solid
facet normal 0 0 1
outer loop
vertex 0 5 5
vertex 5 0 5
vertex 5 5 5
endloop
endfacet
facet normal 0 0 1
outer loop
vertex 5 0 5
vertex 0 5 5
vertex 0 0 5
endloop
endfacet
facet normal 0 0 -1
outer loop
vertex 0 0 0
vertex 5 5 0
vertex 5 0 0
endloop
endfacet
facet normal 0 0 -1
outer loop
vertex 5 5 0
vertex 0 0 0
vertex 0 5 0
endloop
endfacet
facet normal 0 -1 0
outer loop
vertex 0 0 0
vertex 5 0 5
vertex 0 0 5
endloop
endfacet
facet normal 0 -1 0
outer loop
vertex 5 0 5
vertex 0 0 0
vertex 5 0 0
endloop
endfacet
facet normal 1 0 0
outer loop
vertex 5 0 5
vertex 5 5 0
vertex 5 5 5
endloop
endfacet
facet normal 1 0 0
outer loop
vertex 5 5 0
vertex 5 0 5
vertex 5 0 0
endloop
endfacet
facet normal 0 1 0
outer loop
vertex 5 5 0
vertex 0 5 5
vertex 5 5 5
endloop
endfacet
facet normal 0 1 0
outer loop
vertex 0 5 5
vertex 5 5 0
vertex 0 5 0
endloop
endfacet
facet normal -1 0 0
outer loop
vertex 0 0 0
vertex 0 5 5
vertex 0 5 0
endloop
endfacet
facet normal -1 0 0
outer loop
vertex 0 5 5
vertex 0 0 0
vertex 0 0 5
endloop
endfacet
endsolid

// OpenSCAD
// A `!` buried INSIDE a `%` subtree. It still governs the whole model.
//
// WHY IT WAS CHOSEN. `edge_modifier_background` is one `%` on one statement and
// stayed `SAME` through the defect below. The two characters only interact when
// one is inside the other, and no corpus case put them there.
//
// WHAT IT WOULD CATCH — and this one produced A DIFFERENT OBJECT, not a missing
// one. `find_root_tag` walks the instantiated tree and does not care what its
// ancestors are tagged with, so a root modifier written inside a background
// subtree wins exactly as if it had been written at the top. Measured at
// openscad 2026.08.07: this file exports the CUBE, 12 facets, 125 mm³. We used
// to discard the `%` body at PARSE time, never saw the `!` inside it, and
// exported the SPHERE at 31418 mm³ — the wrong part, silently, with the file's
// only refusal being the one that names `%` for a missing preview ghost.
//
// 🔴 THE SPHERE IS THE CONTROL AND IT IS THE WRONG ANSWER ON PURPOSE. A working
// root modifier suppresses it; every regression in this family releases it. That
// is the opposite polarity to a control solid that must always be emitted, and
// it is the polarity this construct allows — `!` exists to suppress siblings, so
// a sibling that is always emitted cannot be written here. It converts a lost
// capability into `DIVERGES` all the same: emit the sphere and the tree leg has
// a 20 mm bounding-box difference to report, rather than a `REFUSED` that `CAD1`
// reads as safe.
//
// ⚠ THE RESIDUAL THIS CASE DOES NOT REACH. The `!` is found by EVALUATING the
// `%` body into a throwaway sink, under the node and iteration budgets. A `!`
// buried deep enough that the search halts on budget before reaching it is not
// honoured, and nothing says so. This file is far under any budget, so it proves
// the mechanism and not its limit. See `docs/audit/2026-08-11-scad-silent-
// divergence.md`.
//
// Decidability: one solid on both sides in the correct run; in a planted run the
// sphere replaces it rather than joining it. Never two overlapping solids.
//
// PLANTED AND WATCHED RED (throwaway copy of `web/src/cad/scad.ts`, md5-verified
// against the live file before the edit; openscad 2026.08.07):
//   · the `%` body discarded at parse time (pre-`d749b176c2` behaviour) -> DIVERGES
//     (this case only, over the full 81-case corpus: SAME 63->61, DIVERGES 4->5
//     — the other move is `edge_modifier_root_on_background` going SAME->REFUSED,
//     which is the blind spot that case's own header records)
%union() {
  !cube(5);
}
sphere(20, $fn = 16);
